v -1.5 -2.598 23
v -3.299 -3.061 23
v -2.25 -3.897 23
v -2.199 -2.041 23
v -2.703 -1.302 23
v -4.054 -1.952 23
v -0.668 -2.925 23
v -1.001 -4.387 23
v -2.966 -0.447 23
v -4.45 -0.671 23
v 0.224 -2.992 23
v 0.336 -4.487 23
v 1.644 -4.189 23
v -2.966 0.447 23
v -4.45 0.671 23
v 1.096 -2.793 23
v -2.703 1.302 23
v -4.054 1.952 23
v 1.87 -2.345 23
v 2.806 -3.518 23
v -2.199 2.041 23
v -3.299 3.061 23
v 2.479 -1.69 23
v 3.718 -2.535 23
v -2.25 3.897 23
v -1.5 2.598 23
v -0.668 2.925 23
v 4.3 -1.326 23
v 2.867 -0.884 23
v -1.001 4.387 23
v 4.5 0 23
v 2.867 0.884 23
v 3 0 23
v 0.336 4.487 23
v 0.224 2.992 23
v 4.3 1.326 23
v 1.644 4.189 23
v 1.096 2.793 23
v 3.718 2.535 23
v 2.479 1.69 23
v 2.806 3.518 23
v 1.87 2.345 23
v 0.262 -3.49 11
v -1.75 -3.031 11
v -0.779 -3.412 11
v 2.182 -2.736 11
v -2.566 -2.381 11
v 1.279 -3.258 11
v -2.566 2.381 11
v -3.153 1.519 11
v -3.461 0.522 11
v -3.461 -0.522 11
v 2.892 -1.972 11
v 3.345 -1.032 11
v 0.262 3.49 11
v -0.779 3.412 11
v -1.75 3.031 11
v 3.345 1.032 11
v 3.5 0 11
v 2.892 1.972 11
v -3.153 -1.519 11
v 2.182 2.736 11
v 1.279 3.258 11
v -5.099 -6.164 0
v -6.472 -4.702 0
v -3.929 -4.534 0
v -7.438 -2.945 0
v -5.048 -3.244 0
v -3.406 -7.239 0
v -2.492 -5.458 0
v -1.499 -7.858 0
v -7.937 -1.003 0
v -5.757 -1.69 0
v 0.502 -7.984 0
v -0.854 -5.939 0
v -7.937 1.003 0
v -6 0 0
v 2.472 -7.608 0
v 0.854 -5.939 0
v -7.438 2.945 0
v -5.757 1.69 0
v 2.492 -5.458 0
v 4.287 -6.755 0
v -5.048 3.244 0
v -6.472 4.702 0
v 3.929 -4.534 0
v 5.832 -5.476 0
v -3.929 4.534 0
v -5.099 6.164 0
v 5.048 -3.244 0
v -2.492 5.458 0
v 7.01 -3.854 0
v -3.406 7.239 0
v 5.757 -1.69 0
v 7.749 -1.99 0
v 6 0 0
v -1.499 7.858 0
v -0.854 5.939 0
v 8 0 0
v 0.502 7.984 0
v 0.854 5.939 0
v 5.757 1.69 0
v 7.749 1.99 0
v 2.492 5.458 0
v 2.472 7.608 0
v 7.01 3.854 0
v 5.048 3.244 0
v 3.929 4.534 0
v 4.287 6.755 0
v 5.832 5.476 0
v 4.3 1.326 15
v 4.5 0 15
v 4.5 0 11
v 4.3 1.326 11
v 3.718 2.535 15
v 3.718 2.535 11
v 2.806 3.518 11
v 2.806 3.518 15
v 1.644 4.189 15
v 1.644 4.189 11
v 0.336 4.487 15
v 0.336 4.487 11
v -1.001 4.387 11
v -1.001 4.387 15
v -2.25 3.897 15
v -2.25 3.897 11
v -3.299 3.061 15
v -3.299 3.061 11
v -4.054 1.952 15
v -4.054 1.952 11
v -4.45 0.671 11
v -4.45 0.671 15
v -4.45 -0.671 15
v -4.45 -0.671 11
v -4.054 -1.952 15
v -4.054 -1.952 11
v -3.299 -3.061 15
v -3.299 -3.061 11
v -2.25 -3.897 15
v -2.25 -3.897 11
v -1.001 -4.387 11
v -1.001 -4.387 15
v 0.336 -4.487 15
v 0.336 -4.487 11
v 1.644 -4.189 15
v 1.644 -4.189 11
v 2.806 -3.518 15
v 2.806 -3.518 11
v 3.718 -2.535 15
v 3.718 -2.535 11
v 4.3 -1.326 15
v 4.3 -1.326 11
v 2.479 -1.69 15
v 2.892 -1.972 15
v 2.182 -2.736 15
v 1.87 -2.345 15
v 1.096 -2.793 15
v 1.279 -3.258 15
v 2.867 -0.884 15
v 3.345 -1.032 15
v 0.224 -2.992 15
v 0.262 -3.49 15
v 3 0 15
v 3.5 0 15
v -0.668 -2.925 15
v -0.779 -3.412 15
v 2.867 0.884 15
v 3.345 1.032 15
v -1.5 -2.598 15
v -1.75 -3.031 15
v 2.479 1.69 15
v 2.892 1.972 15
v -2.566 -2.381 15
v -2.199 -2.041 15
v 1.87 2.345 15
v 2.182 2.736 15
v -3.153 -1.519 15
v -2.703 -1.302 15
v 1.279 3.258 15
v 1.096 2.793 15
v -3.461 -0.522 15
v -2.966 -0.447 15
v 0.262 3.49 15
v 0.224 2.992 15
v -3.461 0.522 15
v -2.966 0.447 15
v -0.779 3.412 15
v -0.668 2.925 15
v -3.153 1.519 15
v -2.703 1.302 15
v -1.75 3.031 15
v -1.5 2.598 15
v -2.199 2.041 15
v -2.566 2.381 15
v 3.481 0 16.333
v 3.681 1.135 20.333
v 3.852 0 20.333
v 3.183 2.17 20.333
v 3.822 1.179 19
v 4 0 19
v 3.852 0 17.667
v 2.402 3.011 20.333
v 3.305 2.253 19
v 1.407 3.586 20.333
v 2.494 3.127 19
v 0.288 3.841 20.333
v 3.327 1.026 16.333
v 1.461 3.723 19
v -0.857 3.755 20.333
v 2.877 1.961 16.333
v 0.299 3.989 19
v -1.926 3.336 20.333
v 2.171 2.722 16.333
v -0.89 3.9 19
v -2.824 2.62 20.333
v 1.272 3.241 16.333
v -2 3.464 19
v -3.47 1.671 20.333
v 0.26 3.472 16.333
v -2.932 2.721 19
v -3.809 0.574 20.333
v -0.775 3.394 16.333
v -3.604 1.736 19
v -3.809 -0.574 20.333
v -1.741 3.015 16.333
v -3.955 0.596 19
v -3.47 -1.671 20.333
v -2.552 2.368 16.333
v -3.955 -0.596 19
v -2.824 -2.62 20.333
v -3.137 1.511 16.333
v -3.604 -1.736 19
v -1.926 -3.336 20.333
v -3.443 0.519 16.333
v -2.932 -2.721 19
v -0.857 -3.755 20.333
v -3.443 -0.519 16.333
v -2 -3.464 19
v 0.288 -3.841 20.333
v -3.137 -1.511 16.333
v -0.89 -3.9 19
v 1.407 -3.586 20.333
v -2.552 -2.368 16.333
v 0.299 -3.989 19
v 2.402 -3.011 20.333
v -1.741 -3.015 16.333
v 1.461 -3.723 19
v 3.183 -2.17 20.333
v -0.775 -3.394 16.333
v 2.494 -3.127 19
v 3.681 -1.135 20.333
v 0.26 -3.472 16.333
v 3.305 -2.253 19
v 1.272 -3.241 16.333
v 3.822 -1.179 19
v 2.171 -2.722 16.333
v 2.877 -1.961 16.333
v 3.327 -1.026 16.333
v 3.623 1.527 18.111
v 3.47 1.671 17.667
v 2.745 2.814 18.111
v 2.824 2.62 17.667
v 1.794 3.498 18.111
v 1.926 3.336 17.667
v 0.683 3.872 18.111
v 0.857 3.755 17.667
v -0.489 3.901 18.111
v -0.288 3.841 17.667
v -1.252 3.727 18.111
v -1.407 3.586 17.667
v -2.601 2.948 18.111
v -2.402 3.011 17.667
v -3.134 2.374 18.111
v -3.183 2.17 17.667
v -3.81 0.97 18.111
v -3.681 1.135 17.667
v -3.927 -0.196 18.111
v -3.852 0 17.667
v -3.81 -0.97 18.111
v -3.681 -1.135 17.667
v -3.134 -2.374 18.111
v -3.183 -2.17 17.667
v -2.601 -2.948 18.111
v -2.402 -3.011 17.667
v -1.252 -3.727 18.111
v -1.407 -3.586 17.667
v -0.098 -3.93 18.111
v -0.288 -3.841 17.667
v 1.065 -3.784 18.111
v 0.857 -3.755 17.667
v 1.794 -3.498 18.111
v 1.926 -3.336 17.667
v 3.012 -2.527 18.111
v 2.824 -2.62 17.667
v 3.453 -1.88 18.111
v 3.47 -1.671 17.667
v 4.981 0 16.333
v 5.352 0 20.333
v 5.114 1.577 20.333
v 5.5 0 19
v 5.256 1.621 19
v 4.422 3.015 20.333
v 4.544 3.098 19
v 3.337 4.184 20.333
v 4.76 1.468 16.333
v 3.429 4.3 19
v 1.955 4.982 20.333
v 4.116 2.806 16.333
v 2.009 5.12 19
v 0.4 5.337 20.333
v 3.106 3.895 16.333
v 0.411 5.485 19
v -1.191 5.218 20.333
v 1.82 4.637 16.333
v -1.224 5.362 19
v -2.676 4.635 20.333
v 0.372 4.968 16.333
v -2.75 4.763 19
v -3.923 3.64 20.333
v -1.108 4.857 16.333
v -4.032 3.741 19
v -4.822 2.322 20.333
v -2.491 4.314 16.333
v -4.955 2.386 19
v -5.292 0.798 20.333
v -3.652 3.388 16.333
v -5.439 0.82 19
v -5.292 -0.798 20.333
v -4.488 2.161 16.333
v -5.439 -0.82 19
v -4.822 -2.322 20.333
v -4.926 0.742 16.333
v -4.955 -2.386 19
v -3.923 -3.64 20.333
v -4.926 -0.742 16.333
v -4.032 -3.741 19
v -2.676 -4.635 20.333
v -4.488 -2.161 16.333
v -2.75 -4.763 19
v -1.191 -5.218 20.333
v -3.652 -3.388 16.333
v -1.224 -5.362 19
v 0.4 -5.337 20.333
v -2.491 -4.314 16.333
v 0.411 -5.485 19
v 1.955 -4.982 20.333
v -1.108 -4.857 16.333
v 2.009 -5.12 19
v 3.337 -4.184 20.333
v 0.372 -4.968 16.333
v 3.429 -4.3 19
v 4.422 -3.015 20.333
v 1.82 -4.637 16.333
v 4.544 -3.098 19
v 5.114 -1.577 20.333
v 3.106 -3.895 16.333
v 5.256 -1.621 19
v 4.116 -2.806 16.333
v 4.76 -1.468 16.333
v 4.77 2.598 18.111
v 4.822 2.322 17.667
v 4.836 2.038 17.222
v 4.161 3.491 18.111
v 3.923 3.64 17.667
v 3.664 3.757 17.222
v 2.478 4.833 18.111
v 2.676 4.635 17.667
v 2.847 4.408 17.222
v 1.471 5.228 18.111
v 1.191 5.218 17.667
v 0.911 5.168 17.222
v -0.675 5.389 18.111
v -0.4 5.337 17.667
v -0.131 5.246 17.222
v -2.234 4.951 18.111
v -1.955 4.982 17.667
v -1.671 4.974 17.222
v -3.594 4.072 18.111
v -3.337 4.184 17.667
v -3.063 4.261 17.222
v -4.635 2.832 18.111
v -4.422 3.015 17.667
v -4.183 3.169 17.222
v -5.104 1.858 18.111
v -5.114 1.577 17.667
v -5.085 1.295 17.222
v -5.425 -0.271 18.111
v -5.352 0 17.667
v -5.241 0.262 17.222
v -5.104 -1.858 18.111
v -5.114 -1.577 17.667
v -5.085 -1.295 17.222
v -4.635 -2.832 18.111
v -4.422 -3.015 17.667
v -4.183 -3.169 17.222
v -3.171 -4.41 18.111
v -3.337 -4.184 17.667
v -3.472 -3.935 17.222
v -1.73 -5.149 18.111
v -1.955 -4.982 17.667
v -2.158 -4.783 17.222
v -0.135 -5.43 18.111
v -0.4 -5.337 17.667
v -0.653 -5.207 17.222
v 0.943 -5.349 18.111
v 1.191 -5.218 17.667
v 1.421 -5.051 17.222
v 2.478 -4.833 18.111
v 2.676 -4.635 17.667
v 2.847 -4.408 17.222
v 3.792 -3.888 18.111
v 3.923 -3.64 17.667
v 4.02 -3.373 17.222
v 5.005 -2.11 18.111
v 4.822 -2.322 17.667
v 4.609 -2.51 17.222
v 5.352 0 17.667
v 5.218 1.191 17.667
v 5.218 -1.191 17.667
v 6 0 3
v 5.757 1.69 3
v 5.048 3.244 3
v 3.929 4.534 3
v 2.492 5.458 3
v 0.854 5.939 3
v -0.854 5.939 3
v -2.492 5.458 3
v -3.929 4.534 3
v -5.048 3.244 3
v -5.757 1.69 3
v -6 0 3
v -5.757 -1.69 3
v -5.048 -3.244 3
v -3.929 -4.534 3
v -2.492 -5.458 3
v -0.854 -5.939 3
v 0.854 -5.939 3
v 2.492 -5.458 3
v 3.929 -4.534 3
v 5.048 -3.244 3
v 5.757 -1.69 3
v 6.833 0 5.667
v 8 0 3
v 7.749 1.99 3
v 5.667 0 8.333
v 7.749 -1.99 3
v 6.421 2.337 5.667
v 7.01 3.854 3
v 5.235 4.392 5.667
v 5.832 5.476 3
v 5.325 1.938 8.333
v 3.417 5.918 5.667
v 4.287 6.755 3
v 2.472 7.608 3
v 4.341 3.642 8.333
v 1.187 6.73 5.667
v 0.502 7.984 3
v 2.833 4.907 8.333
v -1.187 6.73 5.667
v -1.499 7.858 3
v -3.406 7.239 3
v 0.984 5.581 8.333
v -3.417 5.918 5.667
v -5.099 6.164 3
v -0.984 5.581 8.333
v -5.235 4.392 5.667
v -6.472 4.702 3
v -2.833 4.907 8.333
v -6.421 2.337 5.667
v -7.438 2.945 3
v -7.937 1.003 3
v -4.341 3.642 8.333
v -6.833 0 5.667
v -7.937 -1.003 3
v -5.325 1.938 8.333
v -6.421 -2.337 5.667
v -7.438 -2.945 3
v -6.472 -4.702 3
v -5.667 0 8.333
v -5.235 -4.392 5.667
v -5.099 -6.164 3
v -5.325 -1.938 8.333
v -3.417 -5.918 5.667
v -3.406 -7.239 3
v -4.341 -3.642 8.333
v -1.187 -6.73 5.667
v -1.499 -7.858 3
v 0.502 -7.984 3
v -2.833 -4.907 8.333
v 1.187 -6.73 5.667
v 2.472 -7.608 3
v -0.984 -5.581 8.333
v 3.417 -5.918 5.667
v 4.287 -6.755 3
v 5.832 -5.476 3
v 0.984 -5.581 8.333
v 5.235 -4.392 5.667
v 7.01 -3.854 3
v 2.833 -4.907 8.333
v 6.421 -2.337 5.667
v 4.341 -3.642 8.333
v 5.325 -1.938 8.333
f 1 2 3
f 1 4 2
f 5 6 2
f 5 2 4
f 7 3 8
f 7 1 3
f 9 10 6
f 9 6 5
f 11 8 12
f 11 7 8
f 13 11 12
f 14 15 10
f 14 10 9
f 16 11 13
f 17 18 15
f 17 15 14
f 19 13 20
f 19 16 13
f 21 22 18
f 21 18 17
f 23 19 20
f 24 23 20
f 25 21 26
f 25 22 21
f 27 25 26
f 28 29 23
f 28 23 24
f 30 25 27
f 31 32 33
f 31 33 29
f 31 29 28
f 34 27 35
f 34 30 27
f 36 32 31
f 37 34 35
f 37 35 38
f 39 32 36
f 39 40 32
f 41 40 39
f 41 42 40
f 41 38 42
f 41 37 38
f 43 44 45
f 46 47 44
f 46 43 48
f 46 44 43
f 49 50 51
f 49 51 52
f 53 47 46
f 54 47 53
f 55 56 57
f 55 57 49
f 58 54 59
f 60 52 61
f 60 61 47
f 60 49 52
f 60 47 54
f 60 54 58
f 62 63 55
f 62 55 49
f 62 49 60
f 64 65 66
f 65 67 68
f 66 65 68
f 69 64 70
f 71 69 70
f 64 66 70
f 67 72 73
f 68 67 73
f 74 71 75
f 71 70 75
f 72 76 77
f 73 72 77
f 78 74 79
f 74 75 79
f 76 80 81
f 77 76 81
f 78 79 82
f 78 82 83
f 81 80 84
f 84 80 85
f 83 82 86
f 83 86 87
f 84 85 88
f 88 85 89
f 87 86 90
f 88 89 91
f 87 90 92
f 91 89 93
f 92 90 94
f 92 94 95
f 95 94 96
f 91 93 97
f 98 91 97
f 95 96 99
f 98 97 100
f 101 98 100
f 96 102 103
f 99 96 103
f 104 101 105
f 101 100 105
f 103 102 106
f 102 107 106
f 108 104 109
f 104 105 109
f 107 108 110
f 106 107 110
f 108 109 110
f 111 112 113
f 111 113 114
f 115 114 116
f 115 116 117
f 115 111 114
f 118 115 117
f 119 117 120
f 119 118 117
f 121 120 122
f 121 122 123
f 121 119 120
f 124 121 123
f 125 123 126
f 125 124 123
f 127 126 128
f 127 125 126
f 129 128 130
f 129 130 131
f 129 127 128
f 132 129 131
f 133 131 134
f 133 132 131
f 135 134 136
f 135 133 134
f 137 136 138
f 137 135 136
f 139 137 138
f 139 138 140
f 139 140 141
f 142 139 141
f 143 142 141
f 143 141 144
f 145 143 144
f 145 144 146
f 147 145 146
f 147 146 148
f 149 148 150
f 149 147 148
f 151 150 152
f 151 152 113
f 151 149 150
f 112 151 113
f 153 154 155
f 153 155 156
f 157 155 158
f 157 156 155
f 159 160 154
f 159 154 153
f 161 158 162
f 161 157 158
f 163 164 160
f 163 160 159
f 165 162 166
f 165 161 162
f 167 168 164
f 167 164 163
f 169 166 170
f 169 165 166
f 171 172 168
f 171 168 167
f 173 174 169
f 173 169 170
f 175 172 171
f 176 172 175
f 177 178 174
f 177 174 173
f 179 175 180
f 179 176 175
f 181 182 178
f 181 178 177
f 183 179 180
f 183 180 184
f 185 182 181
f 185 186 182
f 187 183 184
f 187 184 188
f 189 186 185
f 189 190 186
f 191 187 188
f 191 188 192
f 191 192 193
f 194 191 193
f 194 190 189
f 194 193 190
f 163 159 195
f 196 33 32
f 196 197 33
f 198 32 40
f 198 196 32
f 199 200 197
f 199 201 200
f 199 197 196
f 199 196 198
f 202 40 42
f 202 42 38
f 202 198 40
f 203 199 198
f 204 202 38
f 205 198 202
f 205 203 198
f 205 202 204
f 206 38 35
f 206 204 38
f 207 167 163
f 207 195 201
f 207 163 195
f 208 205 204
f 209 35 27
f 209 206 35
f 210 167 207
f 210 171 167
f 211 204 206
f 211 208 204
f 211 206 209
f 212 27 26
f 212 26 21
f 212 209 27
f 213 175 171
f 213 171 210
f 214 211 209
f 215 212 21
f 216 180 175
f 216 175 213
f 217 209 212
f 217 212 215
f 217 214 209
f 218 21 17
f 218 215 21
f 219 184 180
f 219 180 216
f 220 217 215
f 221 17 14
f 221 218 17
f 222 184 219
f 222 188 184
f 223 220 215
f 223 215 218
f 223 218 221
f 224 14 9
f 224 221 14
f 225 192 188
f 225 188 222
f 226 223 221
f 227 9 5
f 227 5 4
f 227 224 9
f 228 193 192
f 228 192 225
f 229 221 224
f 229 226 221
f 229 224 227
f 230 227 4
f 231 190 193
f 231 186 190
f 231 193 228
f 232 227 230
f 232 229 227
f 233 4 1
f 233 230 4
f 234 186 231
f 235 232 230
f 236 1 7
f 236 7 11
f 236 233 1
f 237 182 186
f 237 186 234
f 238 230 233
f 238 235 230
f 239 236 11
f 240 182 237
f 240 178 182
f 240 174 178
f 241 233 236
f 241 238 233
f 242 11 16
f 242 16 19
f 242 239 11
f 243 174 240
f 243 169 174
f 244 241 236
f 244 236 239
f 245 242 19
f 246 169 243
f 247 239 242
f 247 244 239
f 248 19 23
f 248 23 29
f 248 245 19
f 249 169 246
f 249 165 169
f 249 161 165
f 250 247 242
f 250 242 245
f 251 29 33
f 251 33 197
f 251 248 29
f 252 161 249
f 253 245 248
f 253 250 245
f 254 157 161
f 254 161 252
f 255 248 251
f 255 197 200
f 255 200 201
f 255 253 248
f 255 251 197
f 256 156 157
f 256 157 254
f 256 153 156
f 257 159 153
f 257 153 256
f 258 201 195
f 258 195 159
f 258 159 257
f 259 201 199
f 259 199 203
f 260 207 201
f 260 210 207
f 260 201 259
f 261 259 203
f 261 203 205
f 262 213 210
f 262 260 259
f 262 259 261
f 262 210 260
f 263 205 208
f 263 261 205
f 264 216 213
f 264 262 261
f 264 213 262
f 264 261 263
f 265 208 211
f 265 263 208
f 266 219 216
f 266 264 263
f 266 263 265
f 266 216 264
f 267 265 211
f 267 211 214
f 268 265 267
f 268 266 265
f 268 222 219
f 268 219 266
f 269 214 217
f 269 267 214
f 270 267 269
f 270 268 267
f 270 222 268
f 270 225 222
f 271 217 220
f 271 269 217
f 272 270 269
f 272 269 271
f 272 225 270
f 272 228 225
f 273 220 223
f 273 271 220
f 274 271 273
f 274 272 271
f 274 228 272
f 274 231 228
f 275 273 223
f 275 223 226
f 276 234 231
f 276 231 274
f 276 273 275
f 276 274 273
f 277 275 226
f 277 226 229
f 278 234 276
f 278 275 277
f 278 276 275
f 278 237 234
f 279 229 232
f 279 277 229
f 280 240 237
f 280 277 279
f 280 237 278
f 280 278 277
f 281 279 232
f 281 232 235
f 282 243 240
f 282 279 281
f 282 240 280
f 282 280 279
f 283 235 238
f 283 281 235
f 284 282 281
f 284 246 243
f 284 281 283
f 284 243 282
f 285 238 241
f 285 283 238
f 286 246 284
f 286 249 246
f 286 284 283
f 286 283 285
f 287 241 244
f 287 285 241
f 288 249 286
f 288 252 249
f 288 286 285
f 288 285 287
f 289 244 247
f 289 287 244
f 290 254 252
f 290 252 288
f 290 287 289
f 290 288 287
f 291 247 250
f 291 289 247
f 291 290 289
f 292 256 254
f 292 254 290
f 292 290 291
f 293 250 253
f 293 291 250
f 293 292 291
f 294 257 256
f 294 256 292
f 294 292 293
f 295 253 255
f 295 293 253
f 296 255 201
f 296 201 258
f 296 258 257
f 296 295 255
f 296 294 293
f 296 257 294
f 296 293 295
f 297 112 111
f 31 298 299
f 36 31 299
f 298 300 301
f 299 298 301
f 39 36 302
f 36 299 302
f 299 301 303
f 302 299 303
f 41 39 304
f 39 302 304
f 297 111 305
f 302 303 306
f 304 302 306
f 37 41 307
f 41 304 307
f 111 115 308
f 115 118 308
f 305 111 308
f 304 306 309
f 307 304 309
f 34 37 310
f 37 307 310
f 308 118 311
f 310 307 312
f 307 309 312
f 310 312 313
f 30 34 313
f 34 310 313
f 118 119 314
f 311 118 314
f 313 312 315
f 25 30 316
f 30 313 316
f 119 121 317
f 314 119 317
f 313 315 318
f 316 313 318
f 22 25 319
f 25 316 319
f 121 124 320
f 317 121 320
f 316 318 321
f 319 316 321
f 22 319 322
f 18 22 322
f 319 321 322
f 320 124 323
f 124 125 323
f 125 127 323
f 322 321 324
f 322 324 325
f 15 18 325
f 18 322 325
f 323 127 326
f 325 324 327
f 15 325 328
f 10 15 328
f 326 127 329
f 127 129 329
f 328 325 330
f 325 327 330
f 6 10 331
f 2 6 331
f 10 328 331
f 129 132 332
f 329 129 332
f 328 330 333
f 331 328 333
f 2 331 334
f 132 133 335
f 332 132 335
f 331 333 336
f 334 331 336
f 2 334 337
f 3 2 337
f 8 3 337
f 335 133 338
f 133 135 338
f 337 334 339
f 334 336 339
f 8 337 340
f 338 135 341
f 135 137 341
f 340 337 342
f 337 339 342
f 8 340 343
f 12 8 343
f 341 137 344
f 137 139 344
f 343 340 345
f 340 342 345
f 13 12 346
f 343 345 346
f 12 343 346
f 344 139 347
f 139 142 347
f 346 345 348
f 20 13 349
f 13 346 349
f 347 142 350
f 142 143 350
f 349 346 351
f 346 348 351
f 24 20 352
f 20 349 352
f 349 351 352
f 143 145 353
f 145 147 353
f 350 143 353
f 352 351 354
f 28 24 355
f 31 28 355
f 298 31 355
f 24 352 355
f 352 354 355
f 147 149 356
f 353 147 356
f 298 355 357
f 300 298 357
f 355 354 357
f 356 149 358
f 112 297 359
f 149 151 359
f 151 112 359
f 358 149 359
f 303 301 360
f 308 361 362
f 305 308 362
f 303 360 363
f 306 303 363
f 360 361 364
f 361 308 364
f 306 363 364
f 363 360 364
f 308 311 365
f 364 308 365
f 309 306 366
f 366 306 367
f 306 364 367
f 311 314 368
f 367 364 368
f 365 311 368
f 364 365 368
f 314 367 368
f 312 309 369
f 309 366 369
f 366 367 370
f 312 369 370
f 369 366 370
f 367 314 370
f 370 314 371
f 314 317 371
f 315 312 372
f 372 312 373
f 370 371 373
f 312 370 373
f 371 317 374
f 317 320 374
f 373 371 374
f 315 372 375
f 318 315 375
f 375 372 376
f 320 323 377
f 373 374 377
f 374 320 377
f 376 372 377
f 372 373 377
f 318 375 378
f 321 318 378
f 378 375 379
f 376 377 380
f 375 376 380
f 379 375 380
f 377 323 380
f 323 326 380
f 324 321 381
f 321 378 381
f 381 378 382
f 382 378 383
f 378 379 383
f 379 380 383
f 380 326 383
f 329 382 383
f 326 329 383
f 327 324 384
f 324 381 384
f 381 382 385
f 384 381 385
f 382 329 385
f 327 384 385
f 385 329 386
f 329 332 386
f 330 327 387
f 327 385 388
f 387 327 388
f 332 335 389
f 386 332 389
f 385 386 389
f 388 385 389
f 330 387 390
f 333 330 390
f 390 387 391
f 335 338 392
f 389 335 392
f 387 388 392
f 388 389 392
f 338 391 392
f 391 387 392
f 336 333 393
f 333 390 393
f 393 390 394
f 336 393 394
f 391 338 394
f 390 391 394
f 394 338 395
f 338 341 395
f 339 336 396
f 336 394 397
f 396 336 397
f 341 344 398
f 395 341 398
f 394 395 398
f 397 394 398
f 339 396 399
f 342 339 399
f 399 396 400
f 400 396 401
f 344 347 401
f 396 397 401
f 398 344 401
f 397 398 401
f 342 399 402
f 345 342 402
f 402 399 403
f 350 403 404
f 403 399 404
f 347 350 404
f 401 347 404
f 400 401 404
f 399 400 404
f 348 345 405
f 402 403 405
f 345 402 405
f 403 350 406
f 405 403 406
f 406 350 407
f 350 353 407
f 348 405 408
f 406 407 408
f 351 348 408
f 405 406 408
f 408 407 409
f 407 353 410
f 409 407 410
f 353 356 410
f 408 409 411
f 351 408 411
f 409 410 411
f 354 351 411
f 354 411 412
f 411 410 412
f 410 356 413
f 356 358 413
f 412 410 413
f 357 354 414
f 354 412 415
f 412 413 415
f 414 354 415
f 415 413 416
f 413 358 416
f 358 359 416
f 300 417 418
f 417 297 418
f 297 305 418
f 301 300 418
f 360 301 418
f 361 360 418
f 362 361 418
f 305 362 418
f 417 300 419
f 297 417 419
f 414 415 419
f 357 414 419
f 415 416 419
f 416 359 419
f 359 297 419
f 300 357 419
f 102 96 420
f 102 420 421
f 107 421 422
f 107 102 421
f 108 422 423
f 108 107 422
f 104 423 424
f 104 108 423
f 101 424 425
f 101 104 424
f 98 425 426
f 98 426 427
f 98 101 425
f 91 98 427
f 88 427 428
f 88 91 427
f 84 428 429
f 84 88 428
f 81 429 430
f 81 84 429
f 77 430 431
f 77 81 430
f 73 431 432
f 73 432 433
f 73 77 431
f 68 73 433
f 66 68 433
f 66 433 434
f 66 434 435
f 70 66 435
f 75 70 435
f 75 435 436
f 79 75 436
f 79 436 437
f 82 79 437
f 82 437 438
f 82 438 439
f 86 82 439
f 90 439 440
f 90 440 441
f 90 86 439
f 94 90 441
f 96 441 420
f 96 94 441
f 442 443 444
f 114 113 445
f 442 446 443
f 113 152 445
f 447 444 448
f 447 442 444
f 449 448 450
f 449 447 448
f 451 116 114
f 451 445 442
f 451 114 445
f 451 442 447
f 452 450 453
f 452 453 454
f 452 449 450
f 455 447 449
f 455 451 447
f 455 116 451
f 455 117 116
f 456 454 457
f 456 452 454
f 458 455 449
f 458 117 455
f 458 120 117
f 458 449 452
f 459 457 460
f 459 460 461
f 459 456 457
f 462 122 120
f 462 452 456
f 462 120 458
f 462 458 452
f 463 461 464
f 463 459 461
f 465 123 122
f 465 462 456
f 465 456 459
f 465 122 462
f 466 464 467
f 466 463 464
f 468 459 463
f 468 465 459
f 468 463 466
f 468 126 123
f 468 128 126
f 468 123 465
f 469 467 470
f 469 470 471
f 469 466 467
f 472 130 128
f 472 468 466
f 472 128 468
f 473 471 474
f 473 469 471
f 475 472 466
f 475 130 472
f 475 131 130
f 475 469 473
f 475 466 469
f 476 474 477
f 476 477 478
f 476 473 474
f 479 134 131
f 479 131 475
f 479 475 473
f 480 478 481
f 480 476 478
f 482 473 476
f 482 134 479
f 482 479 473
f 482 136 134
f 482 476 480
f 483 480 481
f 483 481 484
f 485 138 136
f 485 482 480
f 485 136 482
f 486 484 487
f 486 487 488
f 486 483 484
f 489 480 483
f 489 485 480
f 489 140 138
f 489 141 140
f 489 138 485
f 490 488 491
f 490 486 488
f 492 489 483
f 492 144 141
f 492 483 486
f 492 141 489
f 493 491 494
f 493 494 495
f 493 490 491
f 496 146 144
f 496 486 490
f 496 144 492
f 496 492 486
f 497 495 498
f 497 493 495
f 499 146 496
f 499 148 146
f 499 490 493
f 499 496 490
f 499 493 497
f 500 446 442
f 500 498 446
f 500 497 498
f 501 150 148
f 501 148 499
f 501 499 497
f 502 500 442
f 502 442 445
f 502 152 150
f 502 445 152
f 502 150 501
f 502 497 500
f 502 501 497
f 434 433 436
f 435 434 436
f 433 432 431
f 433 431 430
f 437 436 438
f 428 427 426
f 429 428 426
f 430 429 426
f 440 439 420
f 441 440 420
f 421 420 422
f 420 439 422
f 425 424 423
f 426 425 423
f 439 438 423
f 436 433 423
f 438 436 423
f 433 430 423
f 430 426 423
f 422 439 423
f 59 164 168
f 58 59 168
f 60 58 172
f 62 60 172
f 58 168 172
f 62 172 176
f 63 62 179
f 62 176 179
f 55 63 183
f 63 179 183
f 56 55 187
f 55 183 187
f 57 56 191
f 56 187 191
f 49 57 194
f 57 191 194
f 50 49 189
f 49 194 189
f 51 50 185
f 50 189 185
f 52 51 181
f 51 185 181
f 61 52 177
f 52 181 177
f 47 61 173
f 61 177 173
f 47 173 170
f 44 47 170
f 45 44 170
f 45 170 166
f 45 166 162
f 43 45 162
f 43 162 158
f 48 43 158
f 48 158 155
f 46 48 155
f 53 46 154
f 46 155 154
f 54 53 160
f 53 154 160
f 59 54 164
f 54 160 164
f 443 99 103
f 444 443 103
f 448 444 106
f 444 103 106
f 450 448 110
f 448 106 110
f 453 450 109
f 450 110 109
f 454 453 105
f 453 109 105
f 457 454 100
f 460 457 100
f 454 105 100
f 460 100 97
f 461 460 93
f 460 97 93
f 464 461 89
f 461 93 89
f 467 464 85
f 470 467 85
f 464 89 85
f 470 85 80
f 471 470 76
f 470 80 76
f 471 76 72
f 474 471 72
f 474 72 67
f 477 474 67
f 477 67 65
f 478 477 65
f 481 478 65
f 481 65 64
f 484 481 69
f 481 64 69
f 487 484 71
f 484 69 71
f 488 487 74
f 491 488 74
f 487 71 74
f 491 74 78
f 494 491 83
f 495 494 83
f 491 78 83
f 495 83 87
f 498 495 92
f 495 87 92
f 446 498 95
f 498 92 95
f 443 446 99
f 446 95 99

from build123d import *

# Parameters (mm, degrees)
F6_R      = 4.5
F6_R_2    = 3.5
F9_DEPTH  = 4
F0_R      = 8
F0_R_2    = 6
F10_DEPTH = 3
F2_R      = 8
F4_R      = 4.5


with BuildPart() as f8:
    # F7 (on Front) → F8 (revolve)
    with BuildSketch(Plane.XZ):
        with BuildLine():
            Line((4.5, 23), (3, 23))
            add(Edge.make_bspline(
                [(3, 23), (3.5, 21.6666666667), (4.5, 19), (3.5, 16.3333333333), (3, 15)],
                knots=[0, 0, 0, 0, 0.5, 1, 1, 1, 1], degree=3))
            Line((3, 15), (4.5, 15))
            add(Edge.make_bspline(
                [(4.5, 23), (5, 21.6666666667), (6, 19), (5, 16.3333333333), (4.5, 15)],
                knots=[0, 0, 0, 0, 0.5, 1, 1, 1, 1], degree=3))
        make_face()
    revolve(axis=Axis((0, 0, 19), (0, 0, 1)))

    # F6 (on offset) → F9 (join, through all)
    with BuildSketch(Plane.XY.offset(15)):
        Circle(F6_R)
        Circle(F6_R_2, mode=Mode.SUBTRACT)
    extrude(amount=-F9_DEPTH)



with BuildPart() as f10:
    # F0 (on Top) → F10 (new body, through all)
    with BuildSketch(Plane.XY):
        Circle(F0_R)
        Circle(F0_R_2, mode=Mode.SUBTRACT)
    extrude(amount=F10_DEPTH)


with BuildPart() as f8_1:
    add(f8.part)

    add(f10.part)  # F11 merges F10
    # F2 (on offset) → F11 section 0
    with BuildSketch(Plane.XY.offset(3)):
        Circle(F2_R)
    # F4 (on offset) → F11 section 1
    with BuildSketch(Plane.XY.offset(11)):
        Circle(F4_R)
    loft()


solid = f8_1.part
